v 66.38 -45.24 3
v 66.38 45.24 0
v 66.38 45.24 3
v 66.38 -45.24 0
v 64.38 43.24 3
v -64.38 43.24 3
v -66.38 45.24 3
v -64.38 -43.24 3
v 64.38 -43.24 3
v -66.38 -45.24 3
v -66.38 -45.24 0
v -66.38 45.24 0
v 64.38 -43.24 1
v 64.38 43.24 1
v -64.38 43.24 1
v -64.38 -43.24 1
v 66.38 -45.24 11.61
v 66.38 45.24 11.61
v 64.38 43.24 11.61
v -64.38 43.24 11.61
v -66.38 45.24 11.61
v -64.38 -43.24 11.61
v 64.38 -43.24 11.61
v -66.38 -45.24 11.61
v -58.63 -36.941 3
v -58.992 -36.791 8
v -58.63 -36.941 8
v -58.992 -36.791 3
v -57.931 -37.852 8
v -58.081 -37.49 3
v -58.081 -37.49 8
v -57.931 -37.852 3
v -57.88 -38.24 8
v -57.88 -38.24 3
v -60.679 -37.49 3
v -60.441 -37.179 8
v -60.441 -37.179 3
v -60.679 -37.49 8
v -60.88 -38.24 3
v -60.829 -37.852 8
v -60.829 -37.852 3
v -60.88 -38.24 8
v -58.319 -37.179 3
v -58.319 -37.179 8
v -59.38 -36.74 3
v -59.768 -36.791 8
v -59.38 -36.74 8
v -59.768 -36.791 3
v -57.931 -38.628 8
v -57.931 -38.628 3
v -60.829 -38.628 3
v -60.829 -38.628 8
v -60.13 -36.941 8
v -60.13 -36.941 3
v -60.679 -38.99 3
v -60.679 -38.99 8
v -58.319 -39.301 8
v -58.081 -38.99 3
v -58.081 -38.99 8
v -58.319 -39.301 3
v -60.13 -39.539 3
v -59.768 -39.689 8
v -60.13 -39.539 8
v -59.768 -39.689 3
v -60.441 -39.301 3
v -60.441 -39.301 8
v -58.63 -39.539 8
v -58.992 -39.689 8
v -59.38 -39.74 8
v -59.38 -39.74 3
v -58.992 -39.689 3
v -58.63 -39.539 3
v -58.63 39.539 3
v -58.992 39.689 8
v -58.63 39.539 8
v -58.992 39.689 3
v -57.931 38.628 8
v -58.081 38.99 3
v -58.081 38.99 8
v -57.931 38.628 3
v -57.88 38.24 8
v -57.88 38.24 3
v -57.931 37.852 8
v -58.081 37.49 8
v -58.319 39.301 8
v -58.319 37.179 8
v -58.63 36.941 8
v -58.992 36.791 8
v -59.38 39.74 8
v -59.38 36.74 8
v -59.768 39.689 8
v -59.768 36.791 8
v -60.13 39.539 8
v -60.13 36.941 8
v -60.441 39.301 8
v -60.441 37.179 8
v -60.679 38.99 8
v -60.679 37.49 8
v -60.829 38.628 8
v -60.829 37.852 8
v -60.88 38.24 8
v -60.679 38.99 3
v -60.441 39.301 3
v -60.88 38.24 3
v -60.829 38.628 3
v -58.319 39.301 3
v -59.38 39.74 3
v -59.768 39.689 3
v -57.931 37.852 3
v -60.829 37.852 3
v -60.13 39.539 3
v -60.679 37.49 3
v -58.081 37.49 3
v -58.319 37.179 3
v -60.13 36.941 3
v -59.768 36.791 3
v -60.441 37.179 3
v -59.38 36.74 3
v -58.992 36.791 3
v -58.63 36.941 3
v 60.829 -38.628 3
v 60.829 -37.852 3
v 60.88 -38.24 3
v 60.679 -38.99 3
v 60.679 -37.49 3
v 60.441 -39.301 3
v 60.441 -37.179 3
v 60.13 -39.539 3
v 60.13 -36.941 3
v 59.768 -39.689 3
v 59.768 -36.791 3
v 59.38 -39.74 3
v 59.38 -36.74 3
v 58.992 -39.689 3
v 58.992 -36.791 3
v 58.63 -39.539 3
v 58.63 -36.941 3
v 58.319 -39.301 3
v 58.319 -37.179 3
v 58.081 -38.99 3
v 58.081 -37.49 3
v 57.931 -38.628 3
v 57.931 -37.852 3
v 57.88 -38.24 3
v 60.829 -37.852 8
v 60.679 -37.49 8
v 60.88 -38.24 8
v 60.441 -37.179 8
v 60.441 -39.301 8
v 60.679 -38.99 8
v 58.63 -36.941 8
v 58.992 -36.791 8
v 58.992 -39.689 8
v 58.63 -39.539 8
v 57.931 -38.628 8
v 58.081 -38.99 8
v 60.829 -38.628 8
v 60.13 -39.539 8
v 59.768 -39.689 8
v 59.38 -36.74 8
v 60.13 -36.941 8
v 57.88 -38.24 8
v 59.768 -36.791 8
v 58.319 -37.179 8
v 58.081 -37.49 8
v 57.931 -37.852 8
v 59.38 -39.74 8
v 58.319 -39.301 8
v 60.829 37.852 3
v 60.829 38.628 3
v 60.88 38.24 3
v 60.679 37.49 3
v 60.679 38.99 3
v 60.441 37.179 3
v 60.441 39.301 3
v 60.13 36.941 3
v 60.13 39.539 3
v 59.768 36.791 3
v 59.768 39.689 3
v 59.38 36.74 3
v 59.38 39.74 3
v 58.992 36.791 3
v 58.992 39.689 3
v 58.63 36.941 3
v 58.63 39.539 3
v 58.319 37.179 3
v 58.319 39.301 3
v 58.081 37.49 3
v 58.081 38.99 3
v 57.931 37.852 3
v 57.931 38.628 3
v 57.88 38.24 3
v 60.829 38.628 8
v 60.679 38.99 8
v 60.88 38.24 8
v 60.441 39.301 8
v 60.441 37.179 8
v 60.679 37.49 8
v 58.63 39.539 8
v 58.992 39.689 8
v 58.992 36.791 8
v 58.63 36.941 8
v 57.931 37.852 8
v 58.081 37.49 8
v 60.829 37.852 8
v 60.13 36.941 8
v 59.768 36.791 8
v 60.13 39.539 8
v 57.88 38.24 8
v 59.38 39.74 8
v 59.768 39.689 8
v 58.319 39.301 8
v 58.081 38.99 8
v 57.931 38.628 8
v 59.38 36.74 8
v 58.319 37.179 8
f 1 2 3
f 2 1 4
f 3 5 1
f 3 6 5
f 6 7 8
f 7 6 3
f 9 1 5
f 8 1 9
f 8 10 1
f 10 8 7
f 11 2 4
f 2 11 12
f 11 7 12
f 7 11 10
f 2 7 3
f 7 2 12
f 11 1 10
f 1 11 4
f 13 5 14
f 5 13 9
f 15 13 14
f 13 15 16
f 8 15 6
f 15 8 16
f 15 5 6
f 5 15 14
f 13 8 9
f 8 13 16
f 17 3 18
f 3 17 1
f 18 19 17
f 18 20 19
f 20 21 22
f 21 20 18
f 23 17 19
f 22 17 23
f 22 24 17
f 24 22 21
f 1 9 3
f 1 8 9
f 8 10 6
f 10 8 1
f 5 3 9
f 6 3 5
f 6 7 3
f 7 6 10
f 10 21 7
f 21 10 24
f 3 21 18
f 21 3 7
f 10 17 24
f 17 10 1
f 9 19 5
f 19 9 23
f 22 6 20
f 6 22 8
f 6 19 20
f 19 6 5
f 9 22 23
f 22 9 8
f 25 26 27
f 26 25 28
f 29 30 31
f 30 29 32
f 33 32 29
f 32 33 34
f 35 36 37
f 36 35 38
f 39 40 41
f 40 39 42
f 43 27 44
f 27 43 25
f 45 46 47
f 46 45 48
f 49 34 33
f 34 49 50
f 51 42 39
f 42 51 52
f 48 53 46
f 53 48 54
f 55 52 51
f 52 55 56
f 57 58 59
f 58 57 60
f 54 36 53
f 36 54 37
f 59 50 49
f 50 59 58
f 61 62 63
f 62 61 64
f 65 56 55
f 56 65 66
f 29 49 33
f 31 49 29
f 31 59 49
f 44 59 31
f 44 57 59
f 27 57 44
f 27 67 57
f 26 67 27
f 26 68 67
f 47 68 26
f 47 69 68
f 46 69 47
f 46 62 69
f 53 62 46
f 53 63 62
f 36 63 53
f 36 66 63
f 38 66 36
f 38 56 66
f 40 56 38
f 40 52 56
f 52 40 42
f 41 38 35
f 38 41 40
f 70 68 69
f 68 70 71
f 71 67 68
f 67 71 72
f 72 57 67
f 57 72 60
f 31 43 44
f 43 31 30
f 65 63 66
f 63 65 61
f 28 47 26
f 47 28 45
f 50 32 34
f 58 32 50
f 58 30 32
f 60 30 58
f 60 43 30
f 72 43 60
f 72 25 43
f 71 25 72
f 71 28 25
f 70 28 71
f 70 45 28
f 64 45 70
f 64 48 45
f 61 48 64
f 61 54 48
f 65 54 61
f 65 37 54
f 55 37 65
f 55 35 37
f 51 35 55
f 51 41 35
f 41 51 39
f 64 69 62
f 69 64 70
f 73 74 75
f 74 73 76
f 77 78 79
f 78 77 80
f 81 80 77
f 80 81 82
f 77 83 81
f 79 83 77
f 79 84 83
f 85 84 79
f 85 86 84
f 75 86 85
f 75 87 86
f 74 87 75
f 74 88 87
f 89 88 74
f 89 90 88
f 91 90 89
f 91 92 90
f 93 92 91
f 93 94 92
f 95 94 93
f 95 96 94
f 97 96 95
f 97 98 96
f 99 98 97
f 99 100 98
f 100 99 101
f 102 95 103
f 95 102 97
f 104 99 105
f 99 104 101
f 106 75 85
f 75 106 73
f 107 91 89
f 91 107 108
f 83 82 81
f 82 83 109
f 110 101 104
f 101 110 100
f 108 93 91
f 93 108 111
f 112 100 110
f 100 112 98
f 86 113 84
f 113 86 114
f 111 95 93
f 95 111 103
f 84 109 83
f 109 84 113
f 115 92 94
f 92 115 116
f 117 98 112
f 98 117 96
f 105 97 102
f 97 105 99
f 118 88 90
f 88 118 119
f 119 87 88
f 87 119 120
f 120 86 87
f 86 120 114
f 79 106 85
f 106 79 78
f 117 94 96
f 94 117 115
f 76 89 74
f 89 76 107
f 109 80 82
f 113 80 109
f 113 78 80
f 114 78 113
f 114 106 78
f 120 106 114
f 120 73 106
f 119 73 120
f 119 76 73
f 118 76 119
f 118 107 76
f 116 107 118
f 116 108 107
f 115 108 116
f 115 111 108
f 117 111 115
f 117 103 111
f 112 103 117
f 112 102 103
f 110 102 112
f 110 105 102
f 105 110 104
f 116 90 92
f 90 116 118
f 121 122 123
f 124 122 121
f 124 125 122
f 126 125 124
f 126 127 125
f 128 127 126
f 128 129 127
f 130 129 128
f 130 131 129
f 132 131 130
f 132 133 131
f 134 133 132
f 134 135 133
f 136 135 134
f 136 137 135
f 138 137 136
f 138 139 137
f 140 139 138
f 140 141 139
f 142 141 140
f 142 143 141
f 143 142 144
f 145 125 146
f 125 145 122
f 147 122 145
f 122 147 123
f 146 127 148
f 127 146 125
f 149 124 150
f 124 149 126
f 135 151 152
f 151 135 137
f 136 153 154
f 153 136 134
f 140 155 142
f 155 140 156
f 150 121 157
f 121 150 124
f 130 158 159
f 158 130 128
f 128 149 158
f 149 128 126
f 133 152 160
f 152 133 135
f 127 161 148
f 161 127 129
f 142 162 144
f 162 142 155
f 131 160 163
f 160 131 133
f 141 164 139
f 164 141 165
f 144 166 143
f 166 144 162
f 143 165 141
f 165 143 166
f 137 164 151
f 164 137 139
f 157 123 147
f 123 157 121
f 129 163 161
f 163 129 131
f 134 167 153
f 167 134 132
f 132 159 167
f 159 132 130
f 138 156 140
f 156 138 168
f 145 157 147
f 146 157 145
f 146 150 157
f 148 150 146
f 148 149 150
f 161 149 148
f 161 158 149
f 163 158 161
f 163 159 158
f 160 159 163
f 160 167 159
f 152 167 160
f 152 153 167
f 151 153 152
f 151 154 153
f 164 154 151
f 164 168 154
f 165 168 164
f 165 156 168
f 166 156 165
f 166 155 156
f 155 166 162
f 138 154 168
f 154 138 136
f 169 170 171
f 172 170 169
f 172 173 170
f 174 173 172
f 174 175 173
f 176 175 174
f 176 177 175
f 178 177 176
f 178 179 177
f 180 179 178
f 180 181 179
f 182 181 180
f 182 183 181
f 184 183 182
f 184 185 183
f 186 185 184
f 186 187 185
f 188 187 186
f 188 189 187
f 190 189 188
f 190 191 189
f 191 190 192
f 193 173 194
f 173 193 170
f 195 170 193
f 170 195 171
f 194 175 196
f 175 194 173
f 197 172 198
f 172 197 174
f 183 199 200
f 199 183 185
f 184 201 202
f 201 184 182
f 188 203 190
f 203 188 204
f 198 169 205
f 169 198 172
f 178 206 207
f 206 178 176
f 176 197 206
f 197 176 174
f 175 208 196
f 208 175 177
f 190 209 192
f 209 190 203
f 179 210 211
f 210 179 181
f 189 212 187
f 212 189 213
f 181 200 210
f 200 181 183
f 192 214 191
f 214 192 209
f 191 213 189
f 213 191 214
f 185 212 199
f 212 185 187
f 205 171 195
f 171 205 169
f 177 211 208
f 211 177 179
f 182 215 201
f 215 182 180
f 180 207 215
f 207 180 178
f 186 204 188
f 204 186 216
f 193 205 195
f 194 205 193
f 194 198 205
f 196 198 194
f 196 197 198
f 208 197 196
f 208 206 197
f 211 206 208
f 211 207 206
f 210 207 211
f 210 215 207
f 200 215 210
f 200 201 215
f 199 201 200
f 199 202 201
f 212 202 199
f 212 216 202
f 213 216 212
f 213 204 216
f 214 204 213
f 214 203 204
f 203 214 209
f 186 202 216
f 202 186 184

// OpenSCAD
// 96-well microplate holder — SBS/ANSI standard with alignment pins
// Port of hardware/cad/plate_holder.py
// Regenerate: openscad -o hardware/stl/96well_plate_holder.stl hardware/scad/plate_holder.scad

// Parameters (mm)
PLATE_LENGTH    = 127.76;  // SBS standard
PLATE_WIDTH     = 85.48;   // SBS standard
PLATE_HEIGHT    = 14.35;
WALL_THICKNESS  = 2.0;
BASE_THICKNESS  = 3.0;
HOLDER_CLEARANCE = 0.5;
PIN_DIAMETER    = 3.0;
PIN_HEIGHT      = 5.0;
PIN_INSET       = 5.0;

// Derived
INNER_L    = PLATE_LENGTH + HOLDER_CLEARANCE * 2;  // 128.76
INNER_W    = PLATE_WIDTH  + HOLDER_CLEARANCE * 2;  // 86.48
OUTER_L    = INNER_L + WALL_THICKNESS * 2;          // 132.76
OUTER_W    = INNER_W + WALL_THICKNESS * 2;          // 90.48
WALL_HEIGHT = PLATE_HEIGHT * 0.6;                    // 8.61
FLOOR_DEPTH = 1.0;

union() {
    // Base plate with pocket (floor_depth = 1mm)
    difference() {
        translate([0, 0, BASE_THICKNESS / 2])
            cube([OUTER_L, OUTER_W, BASE_THICKNESS], center = true);
        // Pocket cut (leave 1mm floor)
        translate([0, 0, FLOOR_DEPTH + (BASE_THICKNESS - FLOOR_DEPTH) / 2 + 0.01])
            cube([INNER_L, INNER_W, BASE_THICKNESS - FLOOR_DEPTH + 0.02], center = true);
    }

    // Walls
    translate([0, 0, BASE_THICKNESS + WALL_HEIGHT / 2])
        difference() {
            cube([OUTER_L, OUTER_W, WALL_HEIGHT], center = true);
            cube([INNER_L, INNER_W, WALL_HEIGHT + 1], center = true);
        }

    // 4 alignment pins at corners
    for (sx = [-1, 1])
        for (sy = [-1, 1])
            translate([
                sx * (INNER_L / 2 - PIN_INSET),
                sy * (INNER_W / 2 - PIN_INSET),
                BASE_THICKNESS + PIN_HEIGHT / 2
            ])
                cylinder(h = PIN_HEIGHT, d = PIN_DIAMETER, center = true, $fn = 24);
}
